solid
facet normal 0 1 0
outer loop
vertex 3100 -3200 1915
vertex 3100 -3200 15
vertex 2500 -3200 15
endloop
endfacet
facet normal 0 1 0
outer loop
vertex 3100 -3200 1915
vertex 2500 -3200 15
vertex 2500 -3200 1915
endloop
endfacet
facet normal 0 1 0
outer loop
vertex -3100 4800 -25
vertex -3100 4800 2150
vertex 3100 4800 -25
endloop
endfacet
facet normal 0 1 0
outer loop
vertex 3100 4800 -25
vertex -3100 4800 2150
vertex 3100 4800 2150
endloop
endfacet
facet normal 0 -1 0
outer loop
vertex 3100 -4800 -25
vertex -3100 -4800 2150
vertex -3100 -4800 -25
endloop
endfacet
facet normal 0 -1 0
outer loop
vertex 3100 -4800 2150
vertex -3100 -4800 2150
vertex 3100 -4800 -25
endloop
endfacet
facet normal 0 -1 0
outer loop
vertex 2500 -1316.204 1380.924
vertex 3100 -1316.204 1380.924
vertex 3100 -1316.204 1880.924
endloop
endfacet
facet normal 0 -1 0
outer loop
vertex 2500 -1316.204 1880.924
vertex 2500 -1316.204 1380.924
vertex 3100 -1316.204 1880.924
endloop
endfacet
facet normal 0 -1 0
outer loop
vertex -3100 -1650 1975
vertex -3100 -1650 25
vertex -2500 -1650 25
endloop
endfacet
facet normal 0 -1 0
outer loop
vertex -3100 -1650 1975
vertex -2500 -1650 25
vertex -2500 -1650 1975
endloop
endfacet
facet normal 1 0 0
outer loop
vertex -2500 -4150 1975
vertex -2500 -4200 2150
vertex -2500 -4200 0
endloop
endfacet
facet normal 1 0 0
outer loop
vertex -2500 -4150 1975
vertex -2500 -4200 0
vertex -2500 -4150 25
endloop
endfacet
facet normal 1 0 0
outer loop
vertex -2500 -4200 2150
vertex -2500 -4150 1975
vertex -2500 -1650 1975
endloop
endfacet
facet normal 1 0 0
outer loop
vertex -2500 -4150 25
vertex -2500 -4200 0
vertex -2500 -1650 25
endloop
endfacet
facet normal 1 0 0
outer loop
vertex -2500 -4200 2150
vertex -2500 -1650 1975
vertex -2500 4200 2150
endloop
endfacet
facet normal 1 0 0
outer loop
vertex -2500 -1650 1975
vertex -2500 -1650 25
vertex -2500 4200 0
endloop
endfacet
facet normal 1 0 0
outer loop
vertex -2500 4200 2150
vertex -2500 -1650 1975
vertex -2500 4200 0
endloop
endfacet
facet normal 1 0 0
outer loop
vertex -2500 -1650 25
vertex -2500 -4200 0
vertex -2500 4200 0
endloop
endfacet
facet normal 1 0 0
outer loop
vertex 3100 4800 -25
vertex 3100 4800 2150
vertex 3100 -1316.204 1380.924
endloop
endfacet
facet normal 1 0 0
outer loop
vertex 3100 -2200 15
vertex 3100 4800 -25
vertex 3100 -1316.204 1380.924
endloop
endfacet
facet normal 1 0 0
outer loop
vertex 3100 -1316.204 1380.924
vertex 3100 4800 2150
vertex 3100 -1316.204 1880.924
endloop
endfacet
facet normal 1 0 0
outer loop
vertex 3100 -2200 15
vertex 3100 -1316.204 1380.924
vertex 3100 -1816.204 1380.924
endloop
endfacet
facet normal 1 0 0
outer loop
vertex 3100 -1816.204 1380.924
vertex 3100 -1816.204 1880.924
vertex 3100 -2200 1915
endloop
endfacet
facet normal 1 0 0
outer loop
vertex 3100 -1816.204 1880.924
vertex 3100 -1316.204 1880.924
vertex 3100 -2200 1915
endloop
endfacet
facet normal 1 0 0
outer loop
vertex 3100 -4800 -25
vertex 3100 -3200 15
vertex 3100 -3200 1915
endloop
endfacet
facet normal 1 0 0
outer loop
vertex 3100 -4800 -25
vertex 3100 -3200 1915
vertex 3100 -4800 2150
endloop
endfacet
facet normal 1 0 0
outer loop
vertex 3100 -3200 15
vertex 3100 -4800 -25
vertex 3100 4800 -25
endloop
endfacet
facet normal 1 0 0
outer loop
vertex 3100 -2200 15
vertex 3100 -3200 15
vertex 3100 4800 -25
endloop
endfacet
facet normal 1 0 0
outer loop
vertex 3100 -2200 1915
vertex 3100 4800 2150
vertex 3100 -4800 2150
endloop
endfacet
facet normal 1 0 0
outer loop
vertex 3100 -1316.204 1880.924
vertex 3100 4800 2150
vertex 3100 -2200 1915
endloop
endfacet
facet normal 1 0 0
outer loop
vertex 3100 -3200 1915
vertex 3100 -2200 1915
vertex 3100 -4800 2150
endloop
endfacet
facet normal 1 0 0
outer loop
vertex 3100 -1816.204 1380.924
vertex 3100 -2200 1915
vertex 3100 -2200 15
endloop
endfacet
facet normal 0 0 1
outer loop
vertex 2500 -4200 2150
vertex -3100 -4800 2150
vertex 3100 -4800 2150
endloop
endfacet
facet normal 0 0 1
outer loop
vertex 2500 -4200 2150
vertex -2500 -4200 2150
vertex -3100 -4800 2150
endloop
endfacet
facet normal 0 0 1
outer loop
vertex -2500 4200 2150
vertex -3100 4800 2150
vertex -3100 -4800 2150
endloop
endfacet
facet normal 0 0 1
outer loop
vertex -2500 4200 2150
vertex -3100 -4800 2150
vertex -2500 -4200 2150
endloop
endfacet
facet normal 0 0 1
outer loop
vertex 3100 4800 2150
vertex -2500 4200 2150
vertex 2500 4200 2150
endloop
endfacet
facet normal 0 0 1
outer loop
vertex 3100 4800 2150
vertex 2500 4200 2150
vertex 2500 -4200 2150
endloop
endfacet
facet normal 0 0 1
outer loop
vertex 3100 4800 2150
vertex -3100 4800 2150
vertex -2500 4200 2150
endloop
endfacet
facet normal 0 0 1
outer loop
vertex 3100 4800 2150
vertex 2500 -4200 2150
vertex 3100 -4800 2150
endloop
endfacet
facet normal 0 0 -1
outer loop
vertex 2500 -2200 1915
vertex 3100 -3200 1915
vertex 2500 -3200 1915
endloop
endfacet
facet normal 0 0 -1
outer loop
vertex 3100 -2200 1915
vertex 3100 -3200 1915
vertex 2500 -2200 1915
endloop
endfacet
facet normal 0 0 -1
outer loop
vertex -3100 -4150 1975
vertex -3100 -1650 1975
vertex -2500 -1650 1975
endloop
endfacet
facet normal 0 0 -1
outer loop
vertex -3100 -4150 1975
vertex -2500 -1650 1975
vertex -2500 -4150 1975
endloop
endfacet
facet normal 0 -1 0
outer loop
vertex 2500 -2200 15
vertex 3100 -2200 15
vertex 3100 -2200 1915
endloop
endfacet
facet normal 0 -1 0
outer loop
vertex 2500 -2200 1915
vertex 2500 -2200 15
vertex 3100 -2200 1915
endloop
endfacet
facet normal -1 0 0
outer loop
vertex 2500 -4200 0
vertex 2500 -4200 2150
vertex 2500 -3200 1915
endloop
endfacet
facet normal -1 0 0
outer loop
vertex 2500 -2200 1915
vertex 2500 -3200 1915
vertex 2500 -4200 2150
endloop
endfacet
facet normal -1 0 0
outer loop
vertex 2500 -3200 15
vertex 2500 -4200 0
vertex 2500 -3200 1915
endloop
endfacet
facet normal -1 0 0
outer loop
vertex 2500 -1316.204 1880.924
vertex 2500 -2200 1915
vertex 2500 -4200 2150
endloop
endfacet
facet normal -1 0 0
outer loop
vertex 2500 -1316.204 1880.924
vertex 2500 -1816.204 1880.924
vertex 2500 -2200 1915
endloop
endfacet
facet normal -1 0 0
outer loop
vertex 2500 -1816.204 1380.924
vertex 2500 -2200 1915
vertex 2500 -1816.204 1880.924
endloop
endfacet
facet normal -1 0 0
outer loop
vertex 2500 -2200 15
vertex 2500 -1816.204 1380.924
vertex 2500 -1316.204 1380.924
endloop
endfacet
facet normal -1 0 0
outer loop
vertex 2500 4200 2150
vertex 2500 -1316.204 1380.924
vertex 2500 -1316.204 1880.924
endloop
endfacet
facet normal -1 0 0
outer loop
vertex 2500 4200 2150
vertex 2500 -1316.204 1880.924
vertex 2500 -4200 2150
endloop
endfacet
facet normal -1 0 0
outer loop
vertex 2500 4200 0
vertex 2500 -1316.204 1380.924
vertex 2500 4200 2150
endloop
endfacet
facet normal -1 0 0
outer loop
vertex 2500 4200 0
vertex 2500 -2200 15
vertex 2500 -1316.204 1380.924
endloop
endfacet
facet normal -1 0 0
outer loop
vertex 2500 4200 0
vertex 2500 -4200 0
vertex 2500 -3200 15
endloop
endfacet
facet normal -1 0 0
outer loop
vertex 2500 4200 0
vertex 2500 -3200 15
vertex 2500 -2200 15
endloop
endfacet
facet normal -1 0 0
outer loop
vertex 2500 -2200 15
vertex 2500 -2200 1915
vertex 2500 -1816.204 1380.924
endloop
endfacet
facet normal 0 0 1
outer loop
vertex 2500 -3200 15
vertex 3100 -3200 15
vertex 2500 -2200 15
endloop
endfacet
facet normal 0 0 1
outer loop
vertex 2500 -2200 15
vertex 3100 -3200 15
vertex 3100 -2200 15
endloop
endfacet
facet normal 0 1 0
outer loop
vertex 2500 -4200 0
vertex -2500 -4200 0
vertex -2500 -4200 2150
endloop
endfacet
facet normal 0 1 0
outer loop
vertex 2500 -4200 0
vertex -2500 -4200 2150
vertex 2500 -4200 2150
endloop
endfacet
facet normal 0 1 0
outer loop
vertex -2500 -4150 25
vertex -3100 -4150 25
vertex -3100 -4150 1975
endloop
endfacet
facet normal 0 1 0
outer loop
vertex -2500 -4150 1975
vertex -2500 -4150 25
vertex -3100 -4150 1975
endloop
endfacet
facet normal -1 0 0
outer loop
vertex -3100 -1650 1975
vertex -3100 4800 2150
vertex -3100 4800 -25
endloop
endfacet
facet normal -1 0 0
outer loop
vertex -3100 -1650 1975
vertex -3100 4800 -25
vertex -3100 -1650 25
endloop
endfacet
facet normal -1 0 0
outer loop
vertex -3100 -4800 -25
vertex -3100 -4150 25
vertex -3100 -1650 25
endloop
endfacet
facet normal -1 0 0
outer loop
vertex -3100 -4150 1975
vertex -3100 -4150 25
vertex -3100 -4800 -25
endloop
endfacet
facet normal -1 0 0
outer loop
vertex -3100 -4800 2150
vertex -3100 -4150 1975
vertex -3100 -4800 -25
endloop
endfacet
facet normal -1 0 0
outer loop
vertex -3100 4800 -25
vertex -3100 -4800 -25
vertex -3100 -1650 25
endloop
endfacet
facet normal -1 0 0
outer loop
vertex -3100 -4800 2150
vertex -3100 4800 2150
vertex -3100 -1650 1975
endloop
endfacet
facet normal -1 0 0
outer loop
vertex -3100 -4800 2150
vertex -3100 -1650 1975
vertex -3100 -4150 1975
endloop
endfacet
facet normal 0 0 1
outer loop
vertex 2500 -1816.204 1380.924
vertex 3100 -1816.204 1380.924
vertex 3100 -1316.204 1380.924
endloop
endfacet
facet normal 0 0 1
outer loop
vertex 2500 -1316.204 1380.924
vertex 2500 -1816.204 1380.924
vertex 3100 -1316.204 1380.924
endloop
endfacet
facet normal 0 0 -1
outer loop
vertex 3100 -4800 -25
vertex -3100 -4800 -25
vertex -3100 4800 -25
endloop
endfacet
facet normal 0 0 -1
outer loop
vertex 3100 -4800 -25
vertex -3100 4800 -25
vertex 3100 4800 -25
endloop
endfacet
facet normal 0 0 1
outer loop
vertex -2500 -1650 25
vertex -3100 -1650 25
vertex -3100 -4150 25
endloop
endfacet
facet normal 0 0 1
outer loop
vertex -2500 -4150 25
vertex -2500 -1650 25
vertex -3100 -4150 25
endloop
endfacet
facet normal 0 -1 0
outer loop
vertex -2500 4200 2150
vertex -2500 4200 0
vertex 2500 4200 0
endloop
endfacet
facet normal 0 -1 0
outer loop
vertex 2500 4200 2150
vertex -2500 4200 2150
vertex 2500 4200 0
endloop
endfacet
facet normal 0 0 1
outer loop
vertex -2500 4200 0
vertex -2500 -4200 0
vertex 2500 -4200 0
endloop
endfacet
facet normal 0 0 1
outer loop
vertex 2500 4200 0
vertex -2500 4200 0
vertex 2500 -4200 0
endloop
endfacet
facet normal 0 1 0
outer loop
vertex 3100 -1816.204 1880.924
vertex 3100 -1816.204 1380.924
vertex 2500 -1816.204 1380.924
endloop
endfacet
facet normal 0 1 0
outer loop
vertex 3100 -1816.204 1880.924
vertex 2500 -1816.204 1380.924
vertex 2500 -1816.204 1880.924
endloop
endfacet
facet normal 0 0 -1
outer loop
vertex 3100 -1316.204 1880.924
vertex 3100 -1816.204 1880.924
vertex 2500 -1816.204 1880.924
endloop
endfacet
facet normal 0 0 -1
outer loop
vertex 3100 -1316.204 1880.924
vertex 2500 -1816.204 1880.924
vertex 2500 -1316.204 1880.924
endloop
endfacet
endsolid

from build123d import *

# Parameters (mm, degrees)
F0_W     = 6200
F0_H     = 9600
F0_W_2   = 5000
F0_H_2   = 8400
F1_DEPTH = 2150
F2_W     = 6200
F2_H     = 9600
F3_DEPTH = 25
F4_W     = 2500
F4_H     = 1950
F5_DEPTH = 600
F6_W     = 1000
F6_H     = 1900
F6_W_2   = 500
F6_H_2   = 500
F7_DEPTH = 600


with BuildPart() as f1:
    # F0 (on Top) → F1 (new body)
    with BuildSketch(Plane.XY):
        Rectangle(F0_W, F0_H)
        Rectangle(F0_W_2, F0_H_2, mode=Mode.SUBTRACT)
    extrude(amount=F1_DEPTH)

    # F2 (on face) → F3 (join)
    with BuildSketch(Plane(origin=(0, 0, 0), x_dir=(1, 0, 0), z_dir=(0, 0, -1))):
        Rectangle(F2_W, F2_H)
    extrude(amount=F3_DEPTH)

    # F4 (on face) → F5 (cut, through all)
    with BuildSketch(Plane(origin=(-3100, 0, 0), x_dir=(0, -1, 0), z_dir=(-1, 0, 0))):
        with Locations((2900, 1000)):
            Rectangle(F4_W, F4_H)
    extrude(amount=-F5_DEPTH, mode=Mode.SUBTRACT)

    # F6 (on face) → F7 (cut, through all)
    with BuildSketch(Plane.YZ.offset(3100)):
        with Locations((-2700, 965)):
            Rectangle(F6_W, F6_H)
        with Locations((-1566.203952, 1630.924344)):
            Rectangle(F6_W_2, F6_H_2)
    extrude(amount=-F7_DEPTH, mode=Mode.SUBTRACT)


solid = f1.part
